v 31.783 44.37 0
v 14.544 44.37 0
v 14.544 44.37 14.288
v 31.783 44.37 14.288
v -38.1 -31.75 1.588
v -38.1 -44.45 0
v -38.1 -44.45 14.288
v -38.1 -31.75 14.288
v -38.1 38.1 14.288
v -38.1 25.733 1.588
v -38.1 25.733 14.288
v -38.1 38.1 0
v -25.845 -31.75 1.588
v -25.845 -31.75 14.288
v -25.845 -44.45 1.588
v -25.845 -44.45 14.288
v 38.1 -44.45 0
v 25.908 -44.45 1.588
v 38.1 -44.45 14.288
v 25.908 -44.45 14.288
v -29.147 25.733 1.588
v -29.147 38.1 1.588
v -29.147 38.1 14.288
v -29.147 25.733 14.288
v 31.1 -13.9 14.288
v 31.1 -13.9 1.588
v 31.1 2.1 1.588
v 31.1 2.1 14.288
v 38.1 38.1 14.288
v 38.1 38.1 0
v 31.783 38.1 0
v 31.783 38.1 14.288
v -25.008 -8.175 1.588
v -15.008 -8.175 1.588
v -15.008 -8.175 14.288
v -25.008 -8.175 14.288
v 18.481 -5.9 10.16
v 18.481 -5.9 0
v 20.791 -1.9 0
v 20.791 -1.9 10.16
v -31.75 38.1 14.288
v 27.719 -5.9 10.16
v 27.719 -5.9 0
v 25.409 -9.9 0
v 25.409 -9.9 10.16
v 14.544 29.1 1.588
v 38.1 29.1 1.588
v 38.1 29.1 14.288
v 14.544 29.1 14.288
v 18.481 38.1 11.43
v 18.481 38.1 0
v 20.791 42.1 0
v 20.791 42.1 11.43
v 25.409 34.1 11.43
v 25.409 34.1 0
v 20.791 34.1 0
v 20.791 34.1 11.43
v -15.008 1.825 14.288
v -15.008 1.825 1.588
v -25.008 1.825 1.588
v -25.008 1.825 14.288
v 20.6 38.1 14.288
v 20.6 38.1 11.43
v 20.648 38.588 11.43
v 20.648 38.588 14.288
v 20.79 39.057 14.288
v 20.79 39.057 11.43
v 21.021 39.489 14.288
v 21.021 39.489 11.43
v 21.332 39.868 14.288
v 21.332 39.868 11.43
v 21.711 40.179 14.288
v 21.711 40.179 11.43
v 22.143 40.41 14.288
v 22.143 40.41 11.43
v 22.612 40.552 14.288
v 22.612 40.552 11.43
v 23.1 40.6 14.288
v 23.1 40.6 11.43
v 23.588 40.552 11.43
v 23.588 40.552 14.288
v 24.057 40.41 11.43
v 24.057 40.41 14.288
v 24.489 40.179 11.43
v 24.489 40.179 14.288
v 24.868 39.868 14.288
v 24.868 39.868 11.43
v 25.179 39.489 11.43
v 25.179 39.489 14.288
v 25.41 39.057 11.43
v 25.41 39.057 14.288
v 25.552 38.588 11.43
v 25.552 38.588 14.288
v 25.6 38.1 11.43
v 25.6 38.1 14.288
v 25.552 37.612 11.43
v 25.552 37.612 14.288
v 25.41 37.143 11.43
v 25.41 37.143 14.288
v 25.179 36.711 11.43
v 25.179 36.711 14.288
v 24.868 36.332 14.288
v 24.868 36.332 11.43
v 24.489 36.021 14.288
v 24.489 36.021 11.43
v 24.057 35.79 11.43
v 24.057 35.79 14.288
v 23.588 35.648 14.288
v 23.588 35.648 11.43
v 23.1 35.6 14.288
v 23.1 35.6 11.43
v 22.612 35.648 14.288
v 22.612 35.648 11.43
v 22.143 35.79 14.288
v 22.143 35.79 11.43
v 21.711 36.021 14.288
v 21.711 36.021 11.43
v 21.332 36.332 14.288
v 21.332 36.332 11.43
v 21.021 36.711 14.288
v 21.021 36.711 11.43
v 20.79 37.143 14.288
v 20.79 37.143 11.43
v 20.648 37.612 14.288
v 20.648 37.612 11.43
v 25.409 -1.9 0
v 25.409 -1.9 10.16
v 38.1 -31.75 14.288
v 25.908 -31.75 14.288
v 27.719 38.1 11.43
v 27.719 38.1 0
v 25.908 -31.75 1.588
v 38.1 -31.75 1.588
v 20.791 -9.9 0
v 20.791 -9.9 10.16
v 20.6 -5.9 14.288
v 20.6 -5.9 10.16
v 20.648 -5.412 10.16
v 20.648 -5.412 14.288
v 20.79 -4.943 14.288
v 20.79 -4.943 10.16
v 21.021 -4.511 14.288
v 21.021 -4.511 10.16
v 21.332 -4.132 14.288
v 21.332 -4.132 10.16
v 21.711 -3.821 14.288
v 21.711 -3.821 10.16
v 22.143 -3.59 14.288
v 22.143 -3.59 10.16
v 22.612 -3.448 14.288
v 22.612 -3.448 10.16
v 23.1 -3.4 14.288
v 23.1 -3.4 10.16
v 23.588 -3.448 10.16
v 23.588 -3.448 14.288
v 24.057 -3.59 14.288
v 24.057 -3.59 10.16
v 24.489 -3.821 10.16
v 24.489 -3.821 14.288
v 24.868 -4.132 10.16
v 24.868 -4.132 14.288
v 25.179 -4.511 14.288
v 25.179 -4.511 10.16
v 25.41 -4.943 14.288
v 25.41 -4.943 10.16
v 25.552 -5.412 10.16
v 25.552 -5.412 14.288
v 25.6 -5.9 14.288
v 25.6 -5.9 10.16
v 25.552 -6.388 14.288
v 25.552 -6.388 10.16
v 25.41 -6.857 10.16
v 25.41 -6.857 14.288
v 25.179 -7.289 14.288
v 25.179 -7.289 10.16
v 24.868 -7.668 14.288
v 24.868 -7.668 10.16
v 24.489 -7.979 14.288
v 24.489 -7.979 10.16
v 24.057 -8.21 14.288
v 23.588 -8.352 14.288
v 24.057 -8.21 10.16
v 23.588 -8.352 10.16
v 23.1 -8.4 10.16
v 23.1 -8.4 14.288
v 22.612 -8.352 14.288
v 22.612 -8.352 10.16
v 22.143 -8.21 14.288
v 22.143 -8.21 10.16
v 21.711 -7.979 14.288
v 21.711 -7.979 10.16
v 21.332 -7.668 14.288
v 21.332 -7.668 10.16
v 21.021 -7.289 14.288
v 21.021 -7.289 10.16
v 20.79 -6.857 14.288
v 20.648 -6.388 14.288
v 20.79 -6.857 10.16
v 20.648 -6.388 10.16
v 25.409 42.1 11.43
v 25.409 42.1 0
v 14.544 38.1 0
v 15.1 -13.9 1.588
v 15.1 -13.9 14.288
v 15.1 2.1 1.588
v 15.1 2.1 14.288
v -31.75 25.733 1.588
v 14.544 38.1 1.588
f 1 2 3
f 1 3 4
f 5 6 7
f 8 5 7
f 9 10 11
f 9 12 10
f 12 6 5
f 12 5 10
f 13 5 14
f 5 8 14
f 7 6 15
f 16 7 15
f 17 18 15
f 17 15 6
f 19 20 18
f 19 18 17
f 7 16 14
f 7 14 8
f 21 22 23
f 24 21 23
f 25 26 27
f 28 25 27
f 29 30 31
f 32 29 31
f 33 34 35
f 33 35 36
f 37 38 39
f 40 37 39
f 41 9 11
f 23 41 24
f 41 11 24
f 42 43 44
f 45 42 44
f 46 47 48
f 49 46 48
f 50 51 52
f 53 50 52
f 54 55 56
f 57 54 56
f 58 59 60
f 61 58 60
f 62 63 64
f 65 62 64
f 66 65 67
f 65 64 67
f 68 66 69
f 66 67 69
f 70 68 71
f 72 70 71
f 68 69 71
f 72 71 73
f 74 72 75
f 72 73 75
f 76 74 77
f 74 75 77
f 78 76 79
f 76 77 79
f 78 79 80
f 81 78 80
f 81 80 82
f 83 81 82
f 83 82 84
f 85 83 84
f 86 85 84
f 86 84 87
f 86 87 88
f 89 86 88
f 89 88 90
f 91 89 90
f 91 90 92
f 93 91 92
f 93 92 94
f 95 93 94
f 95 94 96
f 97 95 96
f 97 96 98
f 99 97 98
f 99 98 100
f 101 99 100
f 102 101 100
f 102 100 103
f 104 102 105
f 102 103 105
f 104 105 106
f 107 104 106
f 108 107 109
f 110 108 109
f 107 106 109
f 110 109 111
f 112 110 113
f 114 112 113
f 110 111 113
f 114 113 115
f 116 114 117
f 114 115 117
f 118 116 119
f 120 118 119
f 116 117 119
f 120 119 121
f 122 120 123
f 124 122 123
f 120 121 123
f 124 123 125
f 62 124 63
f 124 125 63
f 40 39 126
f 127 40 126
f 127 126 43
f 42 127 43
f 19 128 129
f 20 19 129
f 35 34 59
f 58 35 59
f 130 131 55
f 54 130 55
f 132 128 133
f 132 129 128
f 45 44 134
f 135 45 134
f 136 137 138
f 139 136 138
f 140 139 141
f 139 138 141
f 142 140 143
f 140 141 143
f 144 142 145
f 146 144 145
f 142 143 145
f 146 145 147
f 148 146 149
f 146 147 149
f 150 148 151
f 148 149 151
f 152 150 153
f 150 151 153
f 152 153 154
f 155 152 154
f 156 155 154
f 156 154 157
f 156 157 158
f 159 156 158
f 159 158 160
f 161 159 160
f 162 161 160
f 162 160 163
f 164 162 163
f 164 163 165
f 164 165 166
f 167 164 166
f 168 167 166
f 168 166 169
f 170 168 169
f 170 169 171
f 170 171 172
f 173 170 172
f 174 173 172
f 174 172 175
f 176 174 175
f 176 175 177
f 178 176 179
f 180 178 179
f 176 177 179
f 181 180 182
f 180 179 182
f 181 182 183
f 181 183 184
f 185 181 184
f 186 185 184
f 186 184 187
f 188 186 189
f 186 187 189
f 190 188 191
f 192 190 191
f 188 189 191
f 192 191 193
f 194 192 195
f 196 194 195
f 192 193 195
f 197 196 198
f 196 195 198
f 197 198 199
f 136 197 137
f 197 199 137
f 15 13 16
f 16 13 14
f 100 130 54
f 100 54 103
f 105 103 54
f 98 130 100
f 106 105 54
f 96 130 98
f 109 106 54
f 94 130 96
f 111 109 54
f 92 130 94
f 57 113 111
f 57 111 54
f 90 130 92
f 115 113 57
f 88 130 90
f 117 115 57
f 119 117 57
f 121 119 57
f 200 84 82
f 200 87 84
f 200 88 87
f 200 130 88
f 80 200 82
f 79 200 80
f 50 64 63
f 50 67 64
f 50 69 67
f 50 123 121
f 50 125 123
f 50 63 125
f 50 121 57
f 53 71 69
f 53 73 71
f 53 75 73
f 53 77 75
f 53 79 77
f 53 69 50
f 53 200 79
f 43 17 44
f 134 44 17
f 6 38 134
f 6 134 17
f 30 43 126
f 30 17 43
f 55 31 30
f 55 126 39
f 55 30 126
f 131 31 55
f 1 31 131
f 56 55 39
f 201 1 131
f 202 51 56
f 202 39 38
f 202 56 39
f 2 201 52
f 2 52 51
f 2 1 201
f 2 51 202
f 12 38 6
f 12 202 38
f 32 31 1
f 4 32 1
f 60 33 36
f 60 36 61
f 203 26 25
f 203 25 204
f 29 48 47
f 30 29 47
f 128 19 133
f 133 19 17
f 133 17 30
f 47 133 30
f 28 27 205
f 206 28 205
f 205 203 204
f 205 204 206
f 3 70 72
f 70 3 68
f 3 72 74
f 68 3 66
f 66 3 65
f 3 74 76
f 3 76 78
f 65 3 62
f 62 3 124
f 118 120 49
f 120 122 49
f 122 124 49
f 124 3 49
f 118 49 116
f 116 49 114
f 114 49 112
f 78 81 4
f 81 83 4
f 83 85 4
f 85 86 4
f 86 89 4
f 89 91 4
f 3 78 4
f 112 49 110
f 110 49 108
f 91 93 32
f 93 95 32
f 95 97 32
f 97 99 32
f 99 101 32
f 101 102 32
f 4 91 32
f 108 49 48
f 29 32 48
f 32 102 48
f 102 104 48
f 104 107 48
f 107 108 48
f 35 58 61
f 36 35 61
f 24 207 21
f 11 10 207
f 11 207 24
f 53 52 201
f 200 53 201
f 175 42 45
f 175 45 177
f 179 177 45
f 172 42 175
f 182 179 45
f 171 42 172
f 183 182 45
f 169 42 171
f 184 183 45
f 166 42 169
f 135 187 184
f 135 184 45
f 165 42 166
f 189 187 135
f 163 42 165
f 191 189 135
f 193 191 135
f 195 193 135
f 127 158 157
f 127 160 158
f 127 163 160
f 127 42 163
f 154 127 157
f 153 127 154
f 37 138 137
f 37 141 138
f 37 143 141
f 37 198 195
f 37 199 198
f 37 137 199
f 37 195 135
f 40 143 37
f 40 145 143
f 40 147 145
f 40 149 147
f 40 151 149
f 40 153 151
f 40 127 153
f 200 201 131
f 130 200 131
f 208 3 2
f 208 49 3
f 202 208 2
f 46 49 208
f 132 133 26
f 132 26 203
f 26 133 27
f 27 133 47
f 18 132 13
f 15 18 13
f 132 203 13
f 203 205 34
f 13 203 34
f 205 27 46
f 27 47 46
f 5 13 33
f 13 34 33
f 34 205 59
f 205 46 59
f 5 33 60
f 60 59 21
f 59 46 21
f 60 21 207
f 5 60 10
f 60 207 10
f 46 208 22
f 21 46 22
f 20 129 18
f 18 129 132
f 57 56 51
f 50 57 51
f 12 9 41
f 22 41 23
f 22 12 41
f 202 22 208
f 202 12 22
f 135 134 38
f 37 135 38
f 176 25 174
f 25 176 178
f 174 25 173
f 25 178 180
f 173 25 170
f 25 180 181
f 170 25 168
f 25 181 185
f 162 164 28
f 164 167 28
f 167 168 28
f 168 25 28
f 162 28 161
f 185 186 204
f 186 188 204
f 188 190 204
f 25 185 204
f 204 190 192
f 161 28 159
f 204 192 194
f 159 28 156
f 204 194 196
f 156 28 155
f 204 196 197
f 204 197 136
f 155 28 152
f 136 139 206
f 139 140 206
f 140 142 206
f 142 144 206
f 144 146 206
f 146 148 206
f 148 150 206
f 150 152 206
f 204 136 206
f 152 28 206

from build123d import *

# Parameters (mm, degrees)
SKETCH1_W            = 76.2
SKETCH1_H            = 76.2
BOSS_EXTRUDE1_DEPTH  = 1.5875
SKETCH3_W            = 6.35
SKETCH3_H            = 3.175
SKETCH3_W_2          = 3.175
SKETCH3_H_2          = 6.35
BOSS_EXTRUDE2_DEPTH  = 12.7
SKETCH4_W            = 6.35
SKETCH4_H            = 14.2875
BOSS_EXTRUDE3_DEPTH  = 7.62
SKETCH5_W            = 14.2875
SKETCH5_H            = 6.35
BOSS_EXTRUDE4_DEPTH  = 7.62
SKETCH6_W            = 14.2875
SKETCH6_H            = 6.35
BOSS_EXTRUDE5_DEPTH  = 7.62
SKETCH7_R            = 1.984375
CUT_EXTRUDE2_DEPTH   = 67.217591743
BOSS_EXTRUDE6_DEPTH  = 76.2
CUT_EXTRUDE3_REACH   = 89.333
SKETCH9_W            = 63.5
SKETCH9_H            = 12.7
BOSS_EXTRUDE7_DEPTH  = 6.35
BOSS_EXTRUDE8_DEPTH  = 6.35
SKETCH12_W           = 7.62
SKETCH12_H           = 12.7
SKETCH12_R           = 1.984375
CUT_EXTRUDE4_DEPTH   = 30.48
SKETCH13_W           = 6.35
SKETCH13_H           = 7.62
CUT_EXTRUDE5_DEPTH   = 30.48
SKETCH15_W           = 6.35
SKETCH15_H           = 12.7
CUT_EXTRUDE6_DEPTH   = 30.48
BOSS_EXTRUDE9_DEPTH  = 14.2875
SKETCH17_R           = 2.5
CUT_EXTRUDE7_DEPTH   = 24.9555
SKETCH18_R           = 2.5
CUT_EXTRUDE8_DEPTH   = 11.43
BOSS_EXTRUDE10_DEPTH = 3.556
SKETCH20_W           = 16
SKETCH20_H           = 16
SKETCH20_R           = 2.5
BOSS_EXTRUDE11_DEPTH = 14.2875
SKETCH21_R           = 2.5
CUT_EXTRUDE9_DEPTH   = 31.0515
SKETCH22_R           = 2.5
CUT_EXTRUDE10_DEPTH  = 10.16
SKETCH23_W           = 23.556
SKETCH23_H           = 14.2875
BOSS_EXTRUDE12_DEPTH = 1.27
SKETCH24_W           = 6.35
SKETCH24_H           = 7.62
CUT_EXTRUDE11_DEPTH  = 30.988
SKETCH25_W           = 7.62
SKETCH25_H           = 12.7
CUT_EXTRUDE12_DEPTH  = 30.988
SKETCH26_W           = 12.7
SKETCH26_H           = 12.7
BOSS_EXTRUDE13_DEPTH = 12.192
SKETCH28_W           = 12.7
SKETCH28_H           = 12.7
BOSS_EXTRUDE15_DEPTH = 12.2555
SKETCH29_W           = 12.7
SKETCH29_H           = 12.367297847
BOSS_EXTRUDE16_DEPTH = 8.9535
SKETCH30_W           = 6.317197846
SKETCH30_H           = 6.27
CUT_EXTRUDE13_DEPTH  = 32.8295
SKETCH27_W           = 10
SKETCH27_H           = 10
BOSS_EXTRUDE17_DEPTH = 14.2875


with BuildPart() as part:
    # Sketch1 → Boss-Extrude1 (new body)
    with BuildSketch(Plane.XY):
        Rectangle(SKETCH1_W, SKETCH1_H)
    extrude(amount=BOSS_EXTRUDE1_DEPTH)

    # Sketch3 → Boss-Extrude2 (add)
    with BuildSketch(Plane.XY.offset(1.5875)):
        with Locations((-34.925, 36.5125)):
            Rectangle(SKETCH3_W, SKETCH3_H)
        with Locations((34.925, 36.5125)):
            Rectangle(SKETCH3_W, SKETCH3_H)
        with Locations((-36.5125, -34.925)):
            Rectangle(SKETCH3_W_2, SKETCH3_H_2)
        with Locations((36.5125, -34.925)):
            Rectangle(SKETCH3_W_2, SKETCH3_H_2)
    extrude(amount=BOSS_EXTRUDE2_DEPTH)

    # Sketch4 → Boss-Extrude3 (add)
    with BuildSketch(Plane(origin=(0, 38.1, 0), x_dir=(1, 0, 0), z_dir=(0, 1, 0))):
        with Locations((-34.925, -7.14375)):
            Rectangle(SKETCH4_W, SKETCH4_H)
        with Locations((34.925, -7.14375)):
            Rectangle(SKETCH4_W, SKETCH4_H)
    extrude(amount=BOSS_EXTRUDE3_DEPTH)

    # Sketch5 → Boss-Extrude4 (add)
    with BuildSketch(Plane(origin=(38.1, 0, 0), x_dir=(0, 0, -1), z_dir=(1, 0, 0))):
        with Locations((-7.14375, -34.925)):
            Rectangle(SKETCH5_W, SKETCH5_H)
    extrude(amount=BOSS_EXTRUDE4_DEPTH)

    # Sketch6 → Boss-Extrude5 (add)
    with BuildSketch(Plane.ZY.offset(38.1)):
        with Locations((7.14375, -34.925)):
            Rectangle(SKETCH6_W, SKETCH6_H)
    extrude(amount=BOSS_EXTRUDE5_DEPTH)

    # Sketch7 → Cut-Extrude2 (cut, through all)
    with BuildSketch(Plane(origin=(0, 0, 0), x_dir=(-1, 0, 0), z_dir=(0, 0, -1))):
        with Locations((-34.925, 41.39168957)):
            Circle(SKETCH7_R)
        with Locations((34.925, 41.39168957)):
            Circle(SKETCH7_R)
        with Locations((-41.275, -34.925)):
            Circle(SKETCH7_R)
        with Locations((41.275, -34.925)):
            Circle(SKETCH7_R)
    extrude(amount=-CUT_EXTRUDE2_DEPTH, mode=Mode.SUBTRACT)

    # Sketch8 → Boss-Extrude6 (add)
    with BuildSketch(Plane.ZY.offset(38.1)):
        Polygon((1.5875, 25.732702153), (14.2875, 34.925), (1.5875, 34.925), align=None)
    extrude(amount=-BOSS_EXTRUDE6_DEPTH)

    # Sketch9 → Cut-Extrude3 (cut, up to next)
    with BuildSketch(Plane(origin=(0, 34.925, 0), x_dir=(1, 0, 0), z_dir=(0, 1, 0)), mode=Mode.PRIVATE) as cut_extrude3_sk1:
        with Locations((0, -7.9375)):
            Rectangle(SKETCH9_W, SKETCH9_H)
    cut_extrude3_tool1 = extrude(cut_extrude3_sk1.sketch, amount=-CUT_EXTRUDE3_REACH, mode=Mode.PRIVATE) & part.part
    add(cut_extrude3_tool1.solids().sort_by_distance((0, 34.925, 7.9375))[0], mode=Mode.SUBTRACT)

    # Sketch10 → Boss-Extrude7 (add)
    with BuildSketch(Plane.XZ.offset(38.1)):
        Polygon((-26.257396371, 1.5875), (-34.925, 14.2875), (-34.925, 1.5875), align=None)
        Polygon((34.925, 14.2875), (26.257396371, 1.5875), (34.925, 1.5875), align=None)
    extrude(amount=-BOSS_EXTRUDE7_DEPTH)

    # Sketch11 → Boss-Extrude8 (add)
    with BuildSketch(Plane.XZ.offset(38.1)):
        Polygon((-45.72, 14.2875), (-45.72, 0), (45.72, 0), (45.72, 14.2875), (34.925, 14.2875), (26.257396371, 1.5875), (-26.257396371, 1.5875), (-34.925, 14.2875), align=None)
    extrude(amount=BOSS_EXTRUDE8_DEPTH)

    # Sketch12 → Cut-Extrude4 (cut)
    with BuildSketch(Plane(origin=(0, 0, 0), x_dir=(-1, 0, 0), z_dir=(0, 0, -1))):
        with Locations((-41.91, -38.1)):
            Rectangle(SKETCH12_W, SKETCH12_H)
        with Locations((-41.275, -34.925)):
            Circle(SKETCH12_R, mode=Mode.SUBTRACT)
    extrude(amount=-CUT_EXTRUDE4_DEPTH, mode=Mode.SUBTRACT)

    # Sketch13 → Cut-Extrude5 (cut)
    with BuildSketch(Plane(origin=(0, 0, 0), x_dir=(-1, 0, 0), z_dir=(0, 0, -1))):
        with Locations((-34.925, 41.91)):
            Rectangle(SKETCH13_W, SKETCH13_H)
    extrude(amount=-CUT_EXTRUDE5_DEPTH, mode=Mode.SUBTRACT)

    # Sketch15 → Cut-Extrude6 (cut)
    with BuildSketch(Plane(origin=(0, 38.1, 0), x_dir=(1, 0, 0), z_dir=(0, 1, 0))):
        with Locations((34.925, -7.9375)):
            Rectangle(SKETCH15_W, SKETCH15_H)
    extrude(amount=-CUT_EXTRUDE6_DEPTH, mode=Mode.SUBTRACT)

    # Sketch16 → Boss-Extrude9 (add)
    with BuildSketch(Plane(origin=(0, 0, 0), x_dir=(-1, 0, 0), z_dir=(0, 0, -1))):
        Polygon((-38.1, 38.1), (-38.1, 43.1), (-18.1, 43.1), (-18.1, 29.1), (-38.1, 29.1), align=None)
    extrude(amount=-BOSS_EXTRUDE9_DEPTH)

    # Sketch17 → Cut-Extrude7 (cut)
    with BuildSketch(Plane(origin=(0, 0, 0), x_dir=(-1, 0, 0), z_dir=(0, 0, -1))):
        with Locations((-23.1, 38.1)):
            Circle(SKETCH17_R)
    extrude(amount=-CUT_EXTRUDE7_DEPTH, mode=Mode.SUBTRACT)

    # Sketch18 → Cut-Extrude8 (cut)
    with BuildSketch(Plane(origin=(0, 0, 0), x_dir=(-1, 0, 0), z_dir=(0, 0, -1))):
        Polygon((-25.409401077, 34.1), (-20.790598923, 34.1), (-18.481197846, 38.1), (-20.790598923, 42.1), (-25.409401077, 42.1), (-27.718802154, 38.1), align=None)
        with Locations((-23.1, 38.1)):
            Circle(SKETCH18_R, mode=Mode.SUBTRACT)
    extrude(amount=-CUT_EXTRUDE8_DEPTH, mode=Mode.SUBTRACT)

    # Sketch19 → Boss-Extrude10 (add)
    with BuildSketch(Plane.ZY.offset(-18.1)):
        Polygon((1.5875, 29.1), (14.2875, 29.1), (14.2875, 43.1), (0, 43.1), (0, 38.1), (1.5875, 38.1), align=None)
    extrude(amount=BOSS_EXTRUDE10_DEPTH)

    # Sketch20 → Boss-Extrude11 (add)
    with BuildSketch(Plane(origin=(0, 0, 0), x_dir=(-1, 0, 0), z_dir=(0, 0, -1))):
        with Locations((-23.1, -5.9)):
            Rectangle(SKETCH20_W, SKETCH20_H)
        with Locations((-23.1, -5.9)):
            Circle(SKETCH20_R, mode=Mode.SUBTRACT)
    extrude(amount=-BOSS_EXTRUDE11_DEPTH)

    # Sketch21 → Cut-Extrude9 (cut)
    with BuildSketch(Plane(origin=(0, 0, 0), x_dir=(-1, 0, 0), z_dir=(0, 0, -1))):
        with Locations((-23.1, -5.9)):
            Circle(SKETCH21_R)
    extrude(amount=-CUT_EXTRUDE9_DEPTH, mode=Mode.SUBTRACT)

    # Sketch22 → Cut-Extrude10 (cut)
    with BuildSketch(Plane(origin=(0, 0, 0), x_dir=(-1, 0, 0), z_dir=(0, 0, -1))):
        Polygon((-25.409401077, -9.9), (-20.790598923, -9.9), (-18.481197846, -5.9), (-20.790598923, -1.9), (-25.409401077, -1.9), (-27.718802154, -5.9), align=None)
        with Locations((-23.1, -5.9)):
            Circle(SKETCH22_R, mode=Mode.SUBTRACT)
    extrude(amount=-CUT_EXTRUDE10_DEPTH, mode=Mode.SUBTRACT)

    # Sketch23 → Boss-Extrude12 (add)
    with BuildSketch(Plane(origin=(0, 43.1, 0), x_dir=(1, 0, 0), z_dir=(0, 1, 0))):
        with Locations((26.322, -7.14375)):
            Rectangle(SKETCH23_W, SKETCH23_H)
    extrude(amount=BOSS_EXTRUDE12_DEPTH)

    # Sketch24 → Cut-Extrude11 (cut)
    with BuildSketch(Plane(origin=(0, 0, 0), x_dir=(-1, 0, 0), z_dir=(0, 0, -1))):
        with Locations((34.925, 41.91)):
            Rectangle(SKETCH24_W, SKETCH24_H)
    extrude(amount=-CUT_EXTRUDE11_DEPTH, mode=Mode.SUBTRACT)

    # Sketch25 → Cut-Extrude12 (cut)
    with BuildSketch(Plane(origin=(0, 0, 0), x_dir=(-1, 0, 0), z_dir=(0, 0, -1))):
        with Locations((41.91, -38.1)):
            Rectangle(SKETCH25_W, SKETCH25_H)
    extrude(amount=-CUT_EXTRUDE12_DEPTH, mode=Mode.SUBTRACT)

    # Sketch26 → Boss-Extrude13 (add)
    with BuildSketch(Plane(origin=(38.1, 0, 0), x_dir=(0, 0, -1), z_dir=(1, 0, 0))):
        with Locations((-7.9375, -38.1)):
            Rectangle(SKETCH26_W, SKETCH26_H)
    extrude(amount=-BOSS_EXTRUDE13_DEPTH)

    # Sketch28 → Boss-Extrude15 (add)
    with BuildSketch(Plane.ZY.offset(38.1)):
        with Locations((7.9375, -38.1)):
            Rectangle(SKETCH28_W, SKETCH28_H)
    extrude(amount=-BOSS_EXTRUDE15_DEPTH)

    # Sketch29 → Boss-Extrude16 (add)
    with BuildSketch(Plane.ZY.offset(38.1)):
        with Locations((7.9375, 31.916351076)):
            Rectangle(SKETCH29_W, SKETCH29_H)
    extrude(amount=-BOSS_EXTRUDE16_DEPTH)

    # Sketch30 → Cut-Extrude13 (cut)
    with BuildSketch(Plane(origin=(0, 0, 0), x_dir=(-1, 0, 0), z_dir=(0, 0, -1))):
        with Locations((-34.941401077, 41.235)):
            Rectangle(SKETCH30_W, SKETCH30_H)
    extrude(amount=-CUT_EXTRUDE13_DEPTH, mode=Mode.SUBTRACT)

    # Sketch27 → Boss-Extrude17 (add)
    with BuildSketch(Plane(origin=(0, 0, 0), x_dir=(-1, 0, 0), z_dir=(0, 0, -1))):
        with Locations((20.007888644, -3.175)):
            Rectangle(SKETCH27_W, SKETCH27_H)
    extrude(amount=-BOSS_EXTRUDE17_DEPTH)


solid = part.part
